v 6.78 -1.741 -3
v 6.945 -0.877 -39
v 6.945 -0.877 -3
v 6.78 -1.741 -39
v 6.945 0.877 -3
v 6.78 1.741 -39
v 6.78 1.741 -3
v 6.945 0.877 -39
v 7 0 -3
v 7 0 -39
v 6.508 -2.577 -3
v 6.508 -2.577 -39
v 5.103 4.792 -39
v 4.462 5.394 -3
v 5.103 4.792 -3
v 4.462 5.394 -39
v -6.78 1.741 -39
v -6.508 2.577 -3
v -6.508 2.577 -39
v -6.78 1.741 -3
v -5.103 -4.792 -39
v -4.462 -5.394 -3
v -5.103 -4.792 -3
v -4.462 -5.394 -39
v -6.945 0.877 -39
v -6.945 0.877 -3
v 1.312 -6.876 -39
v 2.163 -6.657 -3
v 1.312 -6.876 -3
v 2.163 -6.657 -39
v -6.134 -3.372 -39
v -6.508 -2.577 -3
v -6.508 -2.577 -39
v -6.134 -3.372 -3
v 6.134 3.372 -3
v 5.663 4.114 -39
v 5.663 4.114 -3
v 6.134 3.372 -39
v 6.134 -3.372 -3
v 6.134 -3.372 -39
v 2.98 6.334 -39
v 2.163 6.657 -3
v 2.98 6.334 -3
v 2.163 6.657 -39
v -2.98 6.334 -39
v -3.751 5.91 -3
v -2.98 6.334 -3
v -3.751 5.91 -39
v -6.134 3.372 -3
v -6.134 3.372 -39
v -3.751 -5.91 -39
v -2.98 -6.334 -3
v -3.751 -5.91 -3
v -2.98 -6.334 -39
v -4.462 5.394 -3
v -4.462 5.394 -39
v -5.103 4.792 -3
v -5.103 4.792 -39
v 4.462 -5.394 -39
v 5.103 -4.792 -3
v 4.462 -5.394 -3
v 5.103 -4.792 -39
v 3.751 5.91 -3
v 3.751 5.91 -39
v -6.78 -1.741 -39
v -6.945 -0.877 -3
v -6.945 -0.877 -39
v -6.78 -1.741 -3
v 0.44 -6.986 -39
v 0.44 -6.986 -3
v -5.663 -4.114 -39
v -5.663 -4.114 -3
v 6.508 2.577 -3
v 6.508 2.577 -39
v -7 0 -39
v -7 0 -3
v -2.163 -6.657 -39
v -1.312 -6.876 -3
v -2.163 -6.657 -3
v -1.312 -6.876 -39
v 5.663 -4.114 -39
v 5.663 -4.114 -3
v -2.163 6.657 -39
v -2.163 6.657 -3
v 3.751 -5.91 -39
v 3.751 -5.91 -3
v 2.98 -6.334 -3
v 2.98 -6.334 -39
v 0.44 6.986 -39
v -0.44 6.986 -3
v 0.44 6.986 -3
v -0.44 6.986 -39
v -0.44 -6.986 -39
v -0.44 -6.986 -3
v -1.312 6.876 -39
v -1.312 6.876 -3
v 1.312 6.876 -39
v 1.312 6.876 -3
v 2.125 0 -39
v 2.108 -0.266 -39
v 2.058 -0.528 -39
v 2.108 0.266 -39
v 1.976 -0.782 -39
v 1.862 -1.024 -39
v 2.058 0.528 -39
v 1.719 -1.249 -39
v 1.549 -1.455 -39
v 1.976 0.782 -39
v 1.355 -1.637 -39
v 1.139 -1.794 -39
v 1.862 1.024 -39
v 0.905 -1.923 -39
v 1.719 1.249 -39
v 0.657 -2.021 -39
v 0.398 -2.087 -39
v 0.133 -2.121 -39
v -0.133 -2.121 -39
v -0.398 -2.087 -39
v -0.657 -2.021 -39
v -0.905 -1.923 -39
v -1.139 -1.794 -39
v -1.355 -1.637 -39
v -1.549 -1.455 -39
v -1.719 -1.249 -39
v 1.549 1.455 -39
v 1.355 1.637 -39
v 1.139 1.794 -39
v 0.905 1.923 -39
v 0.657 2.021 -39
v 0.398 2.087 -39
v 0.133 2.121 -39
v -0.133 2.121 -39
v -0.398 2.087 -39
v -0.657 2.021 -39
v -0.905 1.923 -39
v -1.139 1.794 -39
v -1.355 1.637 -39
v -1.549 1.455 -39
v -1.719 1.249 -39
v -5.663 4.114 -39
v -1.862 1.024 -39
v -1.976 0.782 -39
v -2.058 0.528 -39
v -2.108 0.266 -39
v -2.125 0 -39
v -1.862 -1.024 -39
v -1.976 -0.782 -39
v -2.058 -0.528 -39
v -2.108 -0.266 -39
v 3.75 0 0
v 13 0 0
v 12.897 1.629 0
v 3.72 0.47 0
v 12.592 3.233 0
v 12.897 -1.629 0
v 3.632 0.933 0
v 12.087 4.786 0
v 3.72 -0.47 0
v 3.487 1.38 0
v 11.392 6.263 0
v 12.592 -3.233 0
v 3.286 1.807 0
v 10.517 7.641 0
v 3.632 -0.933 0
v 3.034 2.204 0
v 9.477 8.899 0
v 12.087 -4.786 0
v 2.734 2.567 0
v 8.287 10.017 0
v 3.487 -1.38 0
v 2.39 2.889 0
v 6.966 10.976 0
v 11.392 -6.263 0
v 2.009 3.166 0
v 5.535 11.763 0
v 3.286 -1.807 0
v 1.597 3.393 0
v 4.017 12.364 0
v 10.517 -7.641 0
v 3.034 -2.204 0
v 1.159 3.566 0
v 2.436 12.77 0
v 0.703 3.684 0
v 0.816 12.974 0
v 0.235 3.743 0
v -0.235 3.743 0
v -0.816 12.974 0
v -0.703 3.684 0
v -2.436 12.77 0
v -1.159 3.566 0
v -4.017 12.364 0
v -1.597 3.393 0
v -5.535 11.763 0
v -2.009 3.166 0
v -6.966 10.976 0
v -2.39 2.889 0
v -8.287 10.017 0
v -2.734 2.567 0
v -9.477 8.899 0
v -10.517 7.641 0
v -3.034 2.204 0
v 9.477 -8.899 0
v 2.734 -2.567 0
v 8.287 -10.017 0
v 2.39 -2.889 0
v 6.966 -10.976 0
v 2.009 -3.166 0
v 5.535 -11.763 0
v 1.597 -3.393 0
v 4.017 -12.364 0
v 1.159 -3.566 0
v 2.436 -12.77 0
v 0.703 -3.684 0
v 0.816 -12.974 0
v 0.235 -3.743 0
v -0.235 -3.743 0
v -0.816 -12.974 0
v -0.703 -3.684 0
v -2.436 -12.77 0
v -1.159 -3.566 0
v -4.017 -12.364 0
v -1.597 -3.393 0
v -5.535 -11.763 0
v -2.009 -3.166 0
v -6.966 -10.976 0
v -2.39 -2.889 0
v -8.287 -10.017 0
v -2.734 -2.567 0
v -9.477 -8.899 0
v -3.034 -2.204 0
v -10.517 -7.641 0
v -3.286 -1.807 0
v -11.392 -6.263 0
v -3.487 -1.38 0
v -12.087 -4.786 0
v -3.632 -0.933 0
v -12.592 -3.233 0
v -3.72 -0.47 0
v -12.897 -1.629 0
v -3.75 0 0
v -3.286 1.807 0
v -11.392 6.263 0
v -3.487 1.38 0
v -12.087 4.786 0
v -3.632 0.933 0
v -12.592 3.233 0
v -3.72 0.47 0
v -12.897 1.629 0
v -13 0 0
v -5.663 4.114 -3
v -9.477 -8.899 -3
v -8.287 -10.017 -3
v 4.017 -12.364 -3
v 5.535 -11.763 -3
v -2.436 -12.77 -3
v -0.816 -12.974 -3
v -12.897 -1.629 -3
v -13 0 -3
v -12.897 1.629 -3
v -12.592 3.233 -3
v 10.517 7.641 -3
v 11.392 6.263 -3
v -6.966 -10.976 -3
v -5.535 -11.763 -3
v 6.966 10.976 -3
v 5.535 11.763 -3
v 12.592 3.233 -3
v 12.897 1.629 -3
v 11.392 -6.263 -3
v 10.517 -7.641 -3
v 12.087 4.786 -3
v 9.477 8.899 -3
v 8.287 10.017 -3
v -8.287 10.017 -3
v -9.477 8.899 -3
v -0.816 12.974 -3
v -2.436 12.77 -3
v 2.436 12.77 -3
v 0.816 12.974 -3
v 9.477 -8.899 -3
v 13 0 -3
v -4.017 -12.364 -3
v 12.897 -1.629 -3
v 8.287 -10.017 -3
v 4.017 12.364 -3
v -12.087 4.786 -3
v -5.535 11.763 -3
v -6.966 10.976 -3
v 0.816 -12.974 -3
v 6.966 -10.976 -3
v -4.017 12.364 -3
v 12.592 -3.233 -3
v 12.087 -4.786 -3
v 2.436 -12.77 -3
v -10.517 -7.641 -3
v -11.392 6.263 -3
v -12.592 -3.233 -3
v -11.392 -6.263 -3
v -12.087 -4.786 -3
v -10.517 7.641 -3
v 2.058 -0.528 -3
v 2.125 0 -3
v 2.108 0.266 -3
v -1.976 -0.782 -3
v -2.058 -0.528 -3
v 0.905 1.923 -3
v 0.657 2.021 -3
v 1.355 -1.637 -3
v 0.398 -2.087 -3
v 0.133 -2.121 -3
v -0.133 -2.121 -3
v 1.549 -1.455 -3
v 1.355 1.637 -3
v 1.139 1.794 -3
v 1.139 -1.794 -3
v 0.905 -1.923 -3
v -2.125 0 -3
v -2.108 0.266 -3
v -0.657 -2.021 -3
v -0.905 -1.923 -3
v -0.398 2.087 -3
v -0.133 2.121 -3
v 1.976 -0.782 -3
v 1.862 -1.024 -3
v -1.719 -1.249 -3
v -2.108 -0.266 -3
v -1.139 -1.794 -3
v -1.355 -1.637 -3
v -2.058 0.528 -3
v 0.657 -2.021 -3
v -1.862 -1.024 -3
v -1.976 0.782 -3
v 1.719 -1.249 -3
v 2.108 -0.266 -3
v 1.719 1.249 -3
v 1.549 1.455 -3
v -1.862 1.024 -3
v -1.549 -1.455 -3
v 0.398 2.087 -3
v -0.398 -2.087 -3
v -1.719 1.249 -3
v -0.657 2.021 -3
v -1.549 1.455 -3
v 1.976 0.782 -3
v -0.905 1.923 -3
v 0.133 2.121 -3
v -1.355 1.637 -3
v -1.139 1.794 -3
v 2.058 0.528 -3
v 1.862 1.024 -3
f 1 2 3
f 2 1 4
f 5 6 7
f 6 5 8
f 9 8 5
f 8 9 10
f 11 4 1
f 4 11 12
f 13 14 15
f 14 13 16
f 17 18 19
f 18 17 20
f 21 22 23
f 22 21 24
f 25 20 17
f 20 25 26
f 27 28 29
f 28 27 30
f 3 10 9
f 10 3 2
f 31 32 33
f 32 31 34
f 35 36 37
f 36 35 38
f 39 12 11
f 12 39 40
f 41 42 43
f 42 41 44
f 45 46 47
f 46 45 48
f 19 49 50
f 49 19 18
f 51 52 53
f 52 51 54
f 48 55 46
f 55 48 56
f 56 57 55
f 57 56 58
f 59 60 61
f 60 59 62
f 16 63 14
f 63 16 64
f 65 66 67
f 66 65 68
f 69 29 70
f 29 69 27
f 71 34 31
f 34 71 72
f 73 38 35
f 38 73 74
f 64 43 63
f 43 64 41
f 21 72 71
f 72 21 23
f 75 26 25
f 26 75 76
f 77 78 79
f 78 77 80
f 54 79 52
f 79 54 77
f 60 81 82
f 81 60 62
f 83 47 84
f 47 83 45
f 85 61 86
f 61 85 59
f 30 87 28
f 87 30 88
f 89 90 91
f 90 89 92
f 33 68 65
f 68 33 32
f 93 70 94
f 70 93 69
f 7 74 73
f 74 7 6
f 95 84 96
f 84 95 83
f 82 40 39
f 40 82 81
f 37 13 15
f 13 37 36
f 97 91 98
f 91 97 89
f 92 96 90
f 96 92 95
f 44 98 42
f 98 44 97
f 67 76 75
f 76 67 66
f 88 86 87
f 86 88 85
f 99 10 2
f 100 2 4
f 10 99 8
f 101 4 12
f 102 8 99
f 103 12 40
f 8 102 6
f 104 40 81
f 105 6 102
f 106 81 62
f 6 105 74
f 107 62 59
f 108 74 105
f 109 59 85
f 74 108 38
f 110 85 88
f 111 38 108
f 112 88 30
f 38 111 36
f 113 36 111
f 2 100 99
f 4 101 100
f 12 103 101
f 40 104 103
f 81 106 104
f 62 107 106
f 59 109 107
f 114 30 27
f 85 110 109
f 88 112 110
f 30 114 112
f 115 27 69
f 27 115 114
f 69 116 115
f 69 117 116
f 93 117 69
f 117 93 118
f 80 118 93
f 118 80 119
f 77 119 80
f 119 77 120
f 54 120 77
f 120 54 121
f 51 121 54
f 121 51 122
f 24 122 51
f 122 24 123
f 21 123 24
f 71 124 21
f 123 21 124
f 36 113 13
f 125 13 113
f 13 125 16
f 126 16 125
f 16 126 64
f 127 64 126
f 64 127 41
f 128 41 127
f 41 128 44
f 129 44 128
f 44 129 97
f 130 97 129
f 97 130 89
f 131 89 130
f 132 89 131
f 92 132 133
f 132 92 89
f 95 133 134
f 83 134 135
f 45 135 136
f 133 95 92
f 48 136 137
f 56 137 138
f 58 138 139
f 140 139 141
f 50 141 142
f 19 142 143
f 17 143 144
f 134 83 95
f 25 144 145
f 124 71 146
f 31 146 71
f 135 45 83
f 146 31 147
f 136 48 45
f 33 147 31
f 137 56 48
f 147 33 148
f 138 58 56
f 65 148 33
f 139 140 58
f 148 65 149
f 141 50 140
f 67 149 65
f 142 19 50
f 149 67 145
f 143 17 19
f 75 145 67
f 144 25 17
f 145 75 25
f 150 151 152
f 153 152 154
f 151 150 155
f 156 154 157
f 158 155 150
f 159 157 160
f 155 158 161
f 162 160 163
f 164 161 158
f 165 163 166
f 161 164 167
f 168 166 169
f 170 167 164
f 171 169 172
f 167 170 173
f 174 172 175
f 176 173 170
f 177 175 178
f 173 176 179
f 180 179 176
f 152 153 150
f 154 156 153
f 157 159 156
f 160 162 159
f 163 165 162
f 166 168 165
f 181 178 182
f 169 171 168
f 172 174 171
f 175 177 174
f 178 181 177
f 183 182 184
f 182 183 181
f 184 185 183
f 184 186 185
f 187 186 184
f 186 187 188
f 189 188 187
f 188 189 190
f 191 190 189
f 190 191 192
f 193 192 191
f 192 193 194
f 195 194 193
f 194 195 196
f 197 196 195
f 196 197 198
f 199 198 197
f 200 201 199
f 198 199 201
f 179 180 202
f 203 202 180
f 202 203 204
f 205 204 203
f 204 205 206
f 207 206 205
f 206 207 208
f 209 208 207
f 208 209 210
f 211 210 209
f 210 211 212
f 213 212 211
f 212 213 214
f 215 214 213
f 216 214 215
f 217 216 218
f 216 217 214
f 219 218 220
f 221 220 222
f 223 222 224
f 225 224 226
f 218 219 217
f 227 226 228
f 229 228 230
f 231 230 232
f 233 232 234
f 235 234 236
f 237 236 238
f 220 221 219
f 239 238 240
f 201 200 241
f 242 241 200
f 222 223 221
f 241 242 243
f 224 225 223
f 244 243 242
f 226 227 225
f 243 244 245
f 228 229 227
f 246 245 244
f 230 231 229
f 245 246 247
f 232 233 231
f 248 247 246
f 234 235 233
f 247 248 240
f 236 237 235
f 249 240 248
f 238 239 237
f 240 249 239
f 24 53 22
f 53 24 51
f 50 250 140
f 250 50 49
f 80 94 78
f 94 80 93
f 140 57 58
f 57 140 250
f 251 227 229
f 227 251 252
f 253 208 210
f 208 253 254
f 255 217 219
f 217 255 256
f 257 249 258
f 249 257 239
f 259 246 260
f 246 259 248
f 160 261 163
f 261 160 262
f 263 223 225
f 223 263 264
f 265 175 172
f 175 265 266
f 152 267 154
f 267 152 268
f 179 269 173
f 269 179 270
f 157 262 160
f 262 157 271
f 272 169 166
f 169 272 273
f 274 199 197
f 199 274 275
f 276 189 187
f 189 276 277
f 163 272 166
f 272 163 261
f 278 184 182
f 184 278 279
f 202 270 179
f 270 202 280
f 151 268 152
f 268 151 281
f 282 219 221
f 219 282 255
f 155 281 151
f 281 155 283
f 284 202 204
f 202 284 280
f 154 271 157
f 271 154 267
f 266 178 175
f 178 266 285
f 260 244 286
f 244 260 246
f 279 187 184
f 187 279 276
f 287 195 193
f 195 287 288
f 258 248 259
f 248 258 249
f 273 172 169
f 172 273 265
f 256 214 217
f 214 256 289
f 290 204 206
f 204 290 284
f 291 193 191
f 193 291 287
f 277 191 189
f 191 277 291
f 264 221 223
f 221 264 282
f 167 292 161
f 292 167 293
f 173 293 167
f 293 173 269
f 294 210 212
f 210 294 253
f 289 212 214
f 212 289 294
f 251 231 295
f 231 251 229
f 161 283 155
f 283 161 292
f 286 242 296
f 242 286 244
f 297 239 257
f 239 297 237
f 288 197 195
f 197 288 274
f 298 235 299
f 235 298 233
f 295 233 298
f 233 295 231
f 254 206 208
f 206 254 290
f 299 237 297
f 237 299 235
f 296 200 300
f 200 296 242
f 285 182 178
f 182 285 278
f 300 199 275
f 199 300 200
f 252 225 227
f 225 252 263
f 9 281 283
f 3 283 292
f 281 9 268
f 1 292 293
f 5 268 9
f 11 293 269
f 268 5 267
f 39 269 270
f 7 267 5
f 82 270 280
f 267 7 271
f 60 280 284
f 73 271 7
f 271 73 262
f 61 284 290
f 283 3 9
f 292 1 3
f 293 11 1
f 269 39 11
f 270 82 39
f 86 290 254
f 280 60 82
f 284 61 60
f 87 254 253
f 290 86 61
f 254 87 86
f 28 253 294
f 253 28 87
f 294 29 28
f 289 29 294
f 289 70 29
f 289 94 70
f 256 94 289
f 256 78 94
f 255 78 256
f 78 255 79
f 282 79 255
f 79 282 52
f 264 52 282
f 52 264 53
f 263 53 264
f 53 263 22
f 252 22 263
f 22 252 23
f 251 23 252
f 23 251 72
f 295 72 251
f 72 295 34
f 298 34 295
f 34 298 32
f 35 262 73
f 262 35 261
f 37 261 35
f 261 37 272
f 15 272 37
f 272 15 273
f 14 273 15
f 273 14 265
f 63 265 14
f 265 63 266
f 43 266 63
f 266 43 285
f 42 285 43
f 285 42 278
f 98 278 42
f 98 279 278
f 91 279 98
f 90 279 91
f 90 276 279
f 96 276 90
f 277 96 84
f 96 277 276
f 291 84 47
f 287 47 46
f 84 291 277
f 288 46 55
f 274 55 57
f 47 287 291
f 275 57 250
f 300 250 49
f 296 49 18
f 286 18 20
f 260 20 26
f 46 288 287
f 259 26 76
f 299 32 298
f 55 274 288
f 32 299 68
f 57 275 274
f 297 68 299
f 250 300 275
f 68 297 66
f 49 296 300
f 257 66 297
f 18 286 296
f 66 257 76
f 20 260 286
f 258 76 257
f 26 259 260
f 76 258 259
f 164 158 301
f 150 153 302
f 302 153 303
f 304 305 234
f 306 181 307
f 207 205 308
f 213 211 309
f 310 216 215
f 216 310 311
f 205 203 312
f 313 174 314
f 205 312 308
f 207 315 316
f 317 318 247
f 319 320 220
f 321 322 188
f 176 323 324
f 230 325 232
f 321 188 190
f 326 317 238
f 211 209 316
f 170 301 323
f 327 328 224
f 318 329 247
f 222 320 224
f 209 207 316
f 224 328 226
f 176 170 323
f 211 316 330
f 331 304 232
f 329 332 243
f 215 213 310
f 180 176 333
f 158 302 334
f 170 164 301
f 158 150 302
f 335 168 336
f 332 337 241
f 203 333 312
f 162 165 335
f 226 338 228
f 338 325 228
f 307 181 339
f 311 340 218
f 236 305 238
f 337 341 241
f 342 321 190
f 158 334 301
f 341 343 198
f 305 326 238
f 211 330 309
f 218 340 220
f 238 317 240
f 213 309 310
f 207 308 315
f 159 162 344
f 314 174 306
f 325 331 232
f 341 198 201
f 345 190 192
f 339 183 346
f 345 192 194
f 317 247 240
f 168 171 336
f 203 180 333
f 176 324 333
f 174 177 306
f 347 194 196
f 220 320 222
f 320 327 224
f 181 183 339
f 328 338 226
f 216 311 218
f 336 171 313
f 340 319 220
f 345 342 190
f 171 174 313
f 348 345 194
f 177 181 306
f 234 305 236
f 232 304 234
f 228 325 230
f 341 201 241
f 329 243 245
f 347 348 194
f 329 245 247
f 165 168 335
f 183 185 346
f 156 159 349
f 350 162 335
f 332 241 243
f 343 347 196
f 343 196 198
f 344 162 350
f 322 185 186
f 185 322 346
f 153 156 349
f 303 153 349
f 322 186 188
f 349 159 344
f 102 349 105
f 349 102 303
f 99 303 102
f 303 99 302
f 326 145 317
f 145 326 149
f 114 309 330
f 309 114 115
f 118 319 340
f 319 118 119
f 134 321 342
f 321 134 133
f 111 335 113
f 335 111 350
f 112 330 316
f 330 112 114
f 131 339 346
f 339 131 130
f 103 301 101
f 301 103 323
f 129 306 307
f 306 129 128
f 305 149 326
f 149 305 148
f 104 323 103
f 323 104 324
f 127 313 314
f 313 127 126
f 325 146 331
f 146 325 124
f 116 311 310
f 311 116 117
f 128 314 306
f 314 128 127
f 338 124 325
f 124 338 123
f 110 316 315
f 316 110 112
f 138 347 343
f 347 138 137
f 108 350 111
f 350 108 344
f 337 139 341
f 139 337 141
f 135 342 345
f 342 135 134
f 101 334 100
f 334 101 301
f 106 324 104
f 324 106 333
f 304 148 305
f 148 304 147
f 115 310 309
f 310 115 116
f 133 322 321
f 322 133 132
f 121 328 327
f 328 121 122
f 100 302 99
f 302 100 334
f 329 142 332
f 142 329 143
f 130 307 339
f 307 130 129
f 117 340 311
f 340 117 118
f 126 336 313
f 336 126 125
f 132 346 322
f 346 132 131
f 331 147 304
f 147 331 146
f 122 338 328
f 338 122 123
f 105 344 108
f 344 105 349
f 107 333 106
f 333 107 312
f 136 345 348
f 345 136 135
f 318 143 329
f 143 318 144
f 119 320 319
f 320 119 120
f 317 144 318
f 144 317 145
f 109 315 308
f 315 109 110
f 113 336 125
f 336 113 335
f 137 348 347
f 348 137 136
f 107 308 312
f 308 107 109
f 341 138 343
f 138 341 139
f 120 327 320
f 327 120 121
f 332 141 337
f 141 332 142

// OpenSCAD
$fn = 50;


difference() {
	union() {
		translate(v = [0, 0, -39.0000000000]) {
			cylinder(h = 39, r = 7.0000000000);
		}
		translate(v = [0, 0, -3.0000000000]) {
			cylinder(h = 3, r = 13.0000000000);
		}
	}
	union() {
		translate(v = [0, 0, 0]) {
			rotate(a = [0, 0, 0]) {
				difference() {
					union() {
						#translate(v = [0, 0, -39.0000000000]) {
							cylinder(h = 39, r = 2.0000000000);
						}
						#translate(v = [0, 0, -3]) {
							cylinder(h = 3, r = 7.0000000000, r1 = 2.1250000000, r2 = 3.7500000000);
						}
						#translate(v = [0, 0, -39.0000000000]) {
							cylinder(h = 39, r = 2.1250000000);
						}
						#translate(v = [0, 0, -39.0000000000]) {
							cylinder(h = 39, r = 2.0000000000);
						}
					}
					union();
				}
			}
		}
	}
}
